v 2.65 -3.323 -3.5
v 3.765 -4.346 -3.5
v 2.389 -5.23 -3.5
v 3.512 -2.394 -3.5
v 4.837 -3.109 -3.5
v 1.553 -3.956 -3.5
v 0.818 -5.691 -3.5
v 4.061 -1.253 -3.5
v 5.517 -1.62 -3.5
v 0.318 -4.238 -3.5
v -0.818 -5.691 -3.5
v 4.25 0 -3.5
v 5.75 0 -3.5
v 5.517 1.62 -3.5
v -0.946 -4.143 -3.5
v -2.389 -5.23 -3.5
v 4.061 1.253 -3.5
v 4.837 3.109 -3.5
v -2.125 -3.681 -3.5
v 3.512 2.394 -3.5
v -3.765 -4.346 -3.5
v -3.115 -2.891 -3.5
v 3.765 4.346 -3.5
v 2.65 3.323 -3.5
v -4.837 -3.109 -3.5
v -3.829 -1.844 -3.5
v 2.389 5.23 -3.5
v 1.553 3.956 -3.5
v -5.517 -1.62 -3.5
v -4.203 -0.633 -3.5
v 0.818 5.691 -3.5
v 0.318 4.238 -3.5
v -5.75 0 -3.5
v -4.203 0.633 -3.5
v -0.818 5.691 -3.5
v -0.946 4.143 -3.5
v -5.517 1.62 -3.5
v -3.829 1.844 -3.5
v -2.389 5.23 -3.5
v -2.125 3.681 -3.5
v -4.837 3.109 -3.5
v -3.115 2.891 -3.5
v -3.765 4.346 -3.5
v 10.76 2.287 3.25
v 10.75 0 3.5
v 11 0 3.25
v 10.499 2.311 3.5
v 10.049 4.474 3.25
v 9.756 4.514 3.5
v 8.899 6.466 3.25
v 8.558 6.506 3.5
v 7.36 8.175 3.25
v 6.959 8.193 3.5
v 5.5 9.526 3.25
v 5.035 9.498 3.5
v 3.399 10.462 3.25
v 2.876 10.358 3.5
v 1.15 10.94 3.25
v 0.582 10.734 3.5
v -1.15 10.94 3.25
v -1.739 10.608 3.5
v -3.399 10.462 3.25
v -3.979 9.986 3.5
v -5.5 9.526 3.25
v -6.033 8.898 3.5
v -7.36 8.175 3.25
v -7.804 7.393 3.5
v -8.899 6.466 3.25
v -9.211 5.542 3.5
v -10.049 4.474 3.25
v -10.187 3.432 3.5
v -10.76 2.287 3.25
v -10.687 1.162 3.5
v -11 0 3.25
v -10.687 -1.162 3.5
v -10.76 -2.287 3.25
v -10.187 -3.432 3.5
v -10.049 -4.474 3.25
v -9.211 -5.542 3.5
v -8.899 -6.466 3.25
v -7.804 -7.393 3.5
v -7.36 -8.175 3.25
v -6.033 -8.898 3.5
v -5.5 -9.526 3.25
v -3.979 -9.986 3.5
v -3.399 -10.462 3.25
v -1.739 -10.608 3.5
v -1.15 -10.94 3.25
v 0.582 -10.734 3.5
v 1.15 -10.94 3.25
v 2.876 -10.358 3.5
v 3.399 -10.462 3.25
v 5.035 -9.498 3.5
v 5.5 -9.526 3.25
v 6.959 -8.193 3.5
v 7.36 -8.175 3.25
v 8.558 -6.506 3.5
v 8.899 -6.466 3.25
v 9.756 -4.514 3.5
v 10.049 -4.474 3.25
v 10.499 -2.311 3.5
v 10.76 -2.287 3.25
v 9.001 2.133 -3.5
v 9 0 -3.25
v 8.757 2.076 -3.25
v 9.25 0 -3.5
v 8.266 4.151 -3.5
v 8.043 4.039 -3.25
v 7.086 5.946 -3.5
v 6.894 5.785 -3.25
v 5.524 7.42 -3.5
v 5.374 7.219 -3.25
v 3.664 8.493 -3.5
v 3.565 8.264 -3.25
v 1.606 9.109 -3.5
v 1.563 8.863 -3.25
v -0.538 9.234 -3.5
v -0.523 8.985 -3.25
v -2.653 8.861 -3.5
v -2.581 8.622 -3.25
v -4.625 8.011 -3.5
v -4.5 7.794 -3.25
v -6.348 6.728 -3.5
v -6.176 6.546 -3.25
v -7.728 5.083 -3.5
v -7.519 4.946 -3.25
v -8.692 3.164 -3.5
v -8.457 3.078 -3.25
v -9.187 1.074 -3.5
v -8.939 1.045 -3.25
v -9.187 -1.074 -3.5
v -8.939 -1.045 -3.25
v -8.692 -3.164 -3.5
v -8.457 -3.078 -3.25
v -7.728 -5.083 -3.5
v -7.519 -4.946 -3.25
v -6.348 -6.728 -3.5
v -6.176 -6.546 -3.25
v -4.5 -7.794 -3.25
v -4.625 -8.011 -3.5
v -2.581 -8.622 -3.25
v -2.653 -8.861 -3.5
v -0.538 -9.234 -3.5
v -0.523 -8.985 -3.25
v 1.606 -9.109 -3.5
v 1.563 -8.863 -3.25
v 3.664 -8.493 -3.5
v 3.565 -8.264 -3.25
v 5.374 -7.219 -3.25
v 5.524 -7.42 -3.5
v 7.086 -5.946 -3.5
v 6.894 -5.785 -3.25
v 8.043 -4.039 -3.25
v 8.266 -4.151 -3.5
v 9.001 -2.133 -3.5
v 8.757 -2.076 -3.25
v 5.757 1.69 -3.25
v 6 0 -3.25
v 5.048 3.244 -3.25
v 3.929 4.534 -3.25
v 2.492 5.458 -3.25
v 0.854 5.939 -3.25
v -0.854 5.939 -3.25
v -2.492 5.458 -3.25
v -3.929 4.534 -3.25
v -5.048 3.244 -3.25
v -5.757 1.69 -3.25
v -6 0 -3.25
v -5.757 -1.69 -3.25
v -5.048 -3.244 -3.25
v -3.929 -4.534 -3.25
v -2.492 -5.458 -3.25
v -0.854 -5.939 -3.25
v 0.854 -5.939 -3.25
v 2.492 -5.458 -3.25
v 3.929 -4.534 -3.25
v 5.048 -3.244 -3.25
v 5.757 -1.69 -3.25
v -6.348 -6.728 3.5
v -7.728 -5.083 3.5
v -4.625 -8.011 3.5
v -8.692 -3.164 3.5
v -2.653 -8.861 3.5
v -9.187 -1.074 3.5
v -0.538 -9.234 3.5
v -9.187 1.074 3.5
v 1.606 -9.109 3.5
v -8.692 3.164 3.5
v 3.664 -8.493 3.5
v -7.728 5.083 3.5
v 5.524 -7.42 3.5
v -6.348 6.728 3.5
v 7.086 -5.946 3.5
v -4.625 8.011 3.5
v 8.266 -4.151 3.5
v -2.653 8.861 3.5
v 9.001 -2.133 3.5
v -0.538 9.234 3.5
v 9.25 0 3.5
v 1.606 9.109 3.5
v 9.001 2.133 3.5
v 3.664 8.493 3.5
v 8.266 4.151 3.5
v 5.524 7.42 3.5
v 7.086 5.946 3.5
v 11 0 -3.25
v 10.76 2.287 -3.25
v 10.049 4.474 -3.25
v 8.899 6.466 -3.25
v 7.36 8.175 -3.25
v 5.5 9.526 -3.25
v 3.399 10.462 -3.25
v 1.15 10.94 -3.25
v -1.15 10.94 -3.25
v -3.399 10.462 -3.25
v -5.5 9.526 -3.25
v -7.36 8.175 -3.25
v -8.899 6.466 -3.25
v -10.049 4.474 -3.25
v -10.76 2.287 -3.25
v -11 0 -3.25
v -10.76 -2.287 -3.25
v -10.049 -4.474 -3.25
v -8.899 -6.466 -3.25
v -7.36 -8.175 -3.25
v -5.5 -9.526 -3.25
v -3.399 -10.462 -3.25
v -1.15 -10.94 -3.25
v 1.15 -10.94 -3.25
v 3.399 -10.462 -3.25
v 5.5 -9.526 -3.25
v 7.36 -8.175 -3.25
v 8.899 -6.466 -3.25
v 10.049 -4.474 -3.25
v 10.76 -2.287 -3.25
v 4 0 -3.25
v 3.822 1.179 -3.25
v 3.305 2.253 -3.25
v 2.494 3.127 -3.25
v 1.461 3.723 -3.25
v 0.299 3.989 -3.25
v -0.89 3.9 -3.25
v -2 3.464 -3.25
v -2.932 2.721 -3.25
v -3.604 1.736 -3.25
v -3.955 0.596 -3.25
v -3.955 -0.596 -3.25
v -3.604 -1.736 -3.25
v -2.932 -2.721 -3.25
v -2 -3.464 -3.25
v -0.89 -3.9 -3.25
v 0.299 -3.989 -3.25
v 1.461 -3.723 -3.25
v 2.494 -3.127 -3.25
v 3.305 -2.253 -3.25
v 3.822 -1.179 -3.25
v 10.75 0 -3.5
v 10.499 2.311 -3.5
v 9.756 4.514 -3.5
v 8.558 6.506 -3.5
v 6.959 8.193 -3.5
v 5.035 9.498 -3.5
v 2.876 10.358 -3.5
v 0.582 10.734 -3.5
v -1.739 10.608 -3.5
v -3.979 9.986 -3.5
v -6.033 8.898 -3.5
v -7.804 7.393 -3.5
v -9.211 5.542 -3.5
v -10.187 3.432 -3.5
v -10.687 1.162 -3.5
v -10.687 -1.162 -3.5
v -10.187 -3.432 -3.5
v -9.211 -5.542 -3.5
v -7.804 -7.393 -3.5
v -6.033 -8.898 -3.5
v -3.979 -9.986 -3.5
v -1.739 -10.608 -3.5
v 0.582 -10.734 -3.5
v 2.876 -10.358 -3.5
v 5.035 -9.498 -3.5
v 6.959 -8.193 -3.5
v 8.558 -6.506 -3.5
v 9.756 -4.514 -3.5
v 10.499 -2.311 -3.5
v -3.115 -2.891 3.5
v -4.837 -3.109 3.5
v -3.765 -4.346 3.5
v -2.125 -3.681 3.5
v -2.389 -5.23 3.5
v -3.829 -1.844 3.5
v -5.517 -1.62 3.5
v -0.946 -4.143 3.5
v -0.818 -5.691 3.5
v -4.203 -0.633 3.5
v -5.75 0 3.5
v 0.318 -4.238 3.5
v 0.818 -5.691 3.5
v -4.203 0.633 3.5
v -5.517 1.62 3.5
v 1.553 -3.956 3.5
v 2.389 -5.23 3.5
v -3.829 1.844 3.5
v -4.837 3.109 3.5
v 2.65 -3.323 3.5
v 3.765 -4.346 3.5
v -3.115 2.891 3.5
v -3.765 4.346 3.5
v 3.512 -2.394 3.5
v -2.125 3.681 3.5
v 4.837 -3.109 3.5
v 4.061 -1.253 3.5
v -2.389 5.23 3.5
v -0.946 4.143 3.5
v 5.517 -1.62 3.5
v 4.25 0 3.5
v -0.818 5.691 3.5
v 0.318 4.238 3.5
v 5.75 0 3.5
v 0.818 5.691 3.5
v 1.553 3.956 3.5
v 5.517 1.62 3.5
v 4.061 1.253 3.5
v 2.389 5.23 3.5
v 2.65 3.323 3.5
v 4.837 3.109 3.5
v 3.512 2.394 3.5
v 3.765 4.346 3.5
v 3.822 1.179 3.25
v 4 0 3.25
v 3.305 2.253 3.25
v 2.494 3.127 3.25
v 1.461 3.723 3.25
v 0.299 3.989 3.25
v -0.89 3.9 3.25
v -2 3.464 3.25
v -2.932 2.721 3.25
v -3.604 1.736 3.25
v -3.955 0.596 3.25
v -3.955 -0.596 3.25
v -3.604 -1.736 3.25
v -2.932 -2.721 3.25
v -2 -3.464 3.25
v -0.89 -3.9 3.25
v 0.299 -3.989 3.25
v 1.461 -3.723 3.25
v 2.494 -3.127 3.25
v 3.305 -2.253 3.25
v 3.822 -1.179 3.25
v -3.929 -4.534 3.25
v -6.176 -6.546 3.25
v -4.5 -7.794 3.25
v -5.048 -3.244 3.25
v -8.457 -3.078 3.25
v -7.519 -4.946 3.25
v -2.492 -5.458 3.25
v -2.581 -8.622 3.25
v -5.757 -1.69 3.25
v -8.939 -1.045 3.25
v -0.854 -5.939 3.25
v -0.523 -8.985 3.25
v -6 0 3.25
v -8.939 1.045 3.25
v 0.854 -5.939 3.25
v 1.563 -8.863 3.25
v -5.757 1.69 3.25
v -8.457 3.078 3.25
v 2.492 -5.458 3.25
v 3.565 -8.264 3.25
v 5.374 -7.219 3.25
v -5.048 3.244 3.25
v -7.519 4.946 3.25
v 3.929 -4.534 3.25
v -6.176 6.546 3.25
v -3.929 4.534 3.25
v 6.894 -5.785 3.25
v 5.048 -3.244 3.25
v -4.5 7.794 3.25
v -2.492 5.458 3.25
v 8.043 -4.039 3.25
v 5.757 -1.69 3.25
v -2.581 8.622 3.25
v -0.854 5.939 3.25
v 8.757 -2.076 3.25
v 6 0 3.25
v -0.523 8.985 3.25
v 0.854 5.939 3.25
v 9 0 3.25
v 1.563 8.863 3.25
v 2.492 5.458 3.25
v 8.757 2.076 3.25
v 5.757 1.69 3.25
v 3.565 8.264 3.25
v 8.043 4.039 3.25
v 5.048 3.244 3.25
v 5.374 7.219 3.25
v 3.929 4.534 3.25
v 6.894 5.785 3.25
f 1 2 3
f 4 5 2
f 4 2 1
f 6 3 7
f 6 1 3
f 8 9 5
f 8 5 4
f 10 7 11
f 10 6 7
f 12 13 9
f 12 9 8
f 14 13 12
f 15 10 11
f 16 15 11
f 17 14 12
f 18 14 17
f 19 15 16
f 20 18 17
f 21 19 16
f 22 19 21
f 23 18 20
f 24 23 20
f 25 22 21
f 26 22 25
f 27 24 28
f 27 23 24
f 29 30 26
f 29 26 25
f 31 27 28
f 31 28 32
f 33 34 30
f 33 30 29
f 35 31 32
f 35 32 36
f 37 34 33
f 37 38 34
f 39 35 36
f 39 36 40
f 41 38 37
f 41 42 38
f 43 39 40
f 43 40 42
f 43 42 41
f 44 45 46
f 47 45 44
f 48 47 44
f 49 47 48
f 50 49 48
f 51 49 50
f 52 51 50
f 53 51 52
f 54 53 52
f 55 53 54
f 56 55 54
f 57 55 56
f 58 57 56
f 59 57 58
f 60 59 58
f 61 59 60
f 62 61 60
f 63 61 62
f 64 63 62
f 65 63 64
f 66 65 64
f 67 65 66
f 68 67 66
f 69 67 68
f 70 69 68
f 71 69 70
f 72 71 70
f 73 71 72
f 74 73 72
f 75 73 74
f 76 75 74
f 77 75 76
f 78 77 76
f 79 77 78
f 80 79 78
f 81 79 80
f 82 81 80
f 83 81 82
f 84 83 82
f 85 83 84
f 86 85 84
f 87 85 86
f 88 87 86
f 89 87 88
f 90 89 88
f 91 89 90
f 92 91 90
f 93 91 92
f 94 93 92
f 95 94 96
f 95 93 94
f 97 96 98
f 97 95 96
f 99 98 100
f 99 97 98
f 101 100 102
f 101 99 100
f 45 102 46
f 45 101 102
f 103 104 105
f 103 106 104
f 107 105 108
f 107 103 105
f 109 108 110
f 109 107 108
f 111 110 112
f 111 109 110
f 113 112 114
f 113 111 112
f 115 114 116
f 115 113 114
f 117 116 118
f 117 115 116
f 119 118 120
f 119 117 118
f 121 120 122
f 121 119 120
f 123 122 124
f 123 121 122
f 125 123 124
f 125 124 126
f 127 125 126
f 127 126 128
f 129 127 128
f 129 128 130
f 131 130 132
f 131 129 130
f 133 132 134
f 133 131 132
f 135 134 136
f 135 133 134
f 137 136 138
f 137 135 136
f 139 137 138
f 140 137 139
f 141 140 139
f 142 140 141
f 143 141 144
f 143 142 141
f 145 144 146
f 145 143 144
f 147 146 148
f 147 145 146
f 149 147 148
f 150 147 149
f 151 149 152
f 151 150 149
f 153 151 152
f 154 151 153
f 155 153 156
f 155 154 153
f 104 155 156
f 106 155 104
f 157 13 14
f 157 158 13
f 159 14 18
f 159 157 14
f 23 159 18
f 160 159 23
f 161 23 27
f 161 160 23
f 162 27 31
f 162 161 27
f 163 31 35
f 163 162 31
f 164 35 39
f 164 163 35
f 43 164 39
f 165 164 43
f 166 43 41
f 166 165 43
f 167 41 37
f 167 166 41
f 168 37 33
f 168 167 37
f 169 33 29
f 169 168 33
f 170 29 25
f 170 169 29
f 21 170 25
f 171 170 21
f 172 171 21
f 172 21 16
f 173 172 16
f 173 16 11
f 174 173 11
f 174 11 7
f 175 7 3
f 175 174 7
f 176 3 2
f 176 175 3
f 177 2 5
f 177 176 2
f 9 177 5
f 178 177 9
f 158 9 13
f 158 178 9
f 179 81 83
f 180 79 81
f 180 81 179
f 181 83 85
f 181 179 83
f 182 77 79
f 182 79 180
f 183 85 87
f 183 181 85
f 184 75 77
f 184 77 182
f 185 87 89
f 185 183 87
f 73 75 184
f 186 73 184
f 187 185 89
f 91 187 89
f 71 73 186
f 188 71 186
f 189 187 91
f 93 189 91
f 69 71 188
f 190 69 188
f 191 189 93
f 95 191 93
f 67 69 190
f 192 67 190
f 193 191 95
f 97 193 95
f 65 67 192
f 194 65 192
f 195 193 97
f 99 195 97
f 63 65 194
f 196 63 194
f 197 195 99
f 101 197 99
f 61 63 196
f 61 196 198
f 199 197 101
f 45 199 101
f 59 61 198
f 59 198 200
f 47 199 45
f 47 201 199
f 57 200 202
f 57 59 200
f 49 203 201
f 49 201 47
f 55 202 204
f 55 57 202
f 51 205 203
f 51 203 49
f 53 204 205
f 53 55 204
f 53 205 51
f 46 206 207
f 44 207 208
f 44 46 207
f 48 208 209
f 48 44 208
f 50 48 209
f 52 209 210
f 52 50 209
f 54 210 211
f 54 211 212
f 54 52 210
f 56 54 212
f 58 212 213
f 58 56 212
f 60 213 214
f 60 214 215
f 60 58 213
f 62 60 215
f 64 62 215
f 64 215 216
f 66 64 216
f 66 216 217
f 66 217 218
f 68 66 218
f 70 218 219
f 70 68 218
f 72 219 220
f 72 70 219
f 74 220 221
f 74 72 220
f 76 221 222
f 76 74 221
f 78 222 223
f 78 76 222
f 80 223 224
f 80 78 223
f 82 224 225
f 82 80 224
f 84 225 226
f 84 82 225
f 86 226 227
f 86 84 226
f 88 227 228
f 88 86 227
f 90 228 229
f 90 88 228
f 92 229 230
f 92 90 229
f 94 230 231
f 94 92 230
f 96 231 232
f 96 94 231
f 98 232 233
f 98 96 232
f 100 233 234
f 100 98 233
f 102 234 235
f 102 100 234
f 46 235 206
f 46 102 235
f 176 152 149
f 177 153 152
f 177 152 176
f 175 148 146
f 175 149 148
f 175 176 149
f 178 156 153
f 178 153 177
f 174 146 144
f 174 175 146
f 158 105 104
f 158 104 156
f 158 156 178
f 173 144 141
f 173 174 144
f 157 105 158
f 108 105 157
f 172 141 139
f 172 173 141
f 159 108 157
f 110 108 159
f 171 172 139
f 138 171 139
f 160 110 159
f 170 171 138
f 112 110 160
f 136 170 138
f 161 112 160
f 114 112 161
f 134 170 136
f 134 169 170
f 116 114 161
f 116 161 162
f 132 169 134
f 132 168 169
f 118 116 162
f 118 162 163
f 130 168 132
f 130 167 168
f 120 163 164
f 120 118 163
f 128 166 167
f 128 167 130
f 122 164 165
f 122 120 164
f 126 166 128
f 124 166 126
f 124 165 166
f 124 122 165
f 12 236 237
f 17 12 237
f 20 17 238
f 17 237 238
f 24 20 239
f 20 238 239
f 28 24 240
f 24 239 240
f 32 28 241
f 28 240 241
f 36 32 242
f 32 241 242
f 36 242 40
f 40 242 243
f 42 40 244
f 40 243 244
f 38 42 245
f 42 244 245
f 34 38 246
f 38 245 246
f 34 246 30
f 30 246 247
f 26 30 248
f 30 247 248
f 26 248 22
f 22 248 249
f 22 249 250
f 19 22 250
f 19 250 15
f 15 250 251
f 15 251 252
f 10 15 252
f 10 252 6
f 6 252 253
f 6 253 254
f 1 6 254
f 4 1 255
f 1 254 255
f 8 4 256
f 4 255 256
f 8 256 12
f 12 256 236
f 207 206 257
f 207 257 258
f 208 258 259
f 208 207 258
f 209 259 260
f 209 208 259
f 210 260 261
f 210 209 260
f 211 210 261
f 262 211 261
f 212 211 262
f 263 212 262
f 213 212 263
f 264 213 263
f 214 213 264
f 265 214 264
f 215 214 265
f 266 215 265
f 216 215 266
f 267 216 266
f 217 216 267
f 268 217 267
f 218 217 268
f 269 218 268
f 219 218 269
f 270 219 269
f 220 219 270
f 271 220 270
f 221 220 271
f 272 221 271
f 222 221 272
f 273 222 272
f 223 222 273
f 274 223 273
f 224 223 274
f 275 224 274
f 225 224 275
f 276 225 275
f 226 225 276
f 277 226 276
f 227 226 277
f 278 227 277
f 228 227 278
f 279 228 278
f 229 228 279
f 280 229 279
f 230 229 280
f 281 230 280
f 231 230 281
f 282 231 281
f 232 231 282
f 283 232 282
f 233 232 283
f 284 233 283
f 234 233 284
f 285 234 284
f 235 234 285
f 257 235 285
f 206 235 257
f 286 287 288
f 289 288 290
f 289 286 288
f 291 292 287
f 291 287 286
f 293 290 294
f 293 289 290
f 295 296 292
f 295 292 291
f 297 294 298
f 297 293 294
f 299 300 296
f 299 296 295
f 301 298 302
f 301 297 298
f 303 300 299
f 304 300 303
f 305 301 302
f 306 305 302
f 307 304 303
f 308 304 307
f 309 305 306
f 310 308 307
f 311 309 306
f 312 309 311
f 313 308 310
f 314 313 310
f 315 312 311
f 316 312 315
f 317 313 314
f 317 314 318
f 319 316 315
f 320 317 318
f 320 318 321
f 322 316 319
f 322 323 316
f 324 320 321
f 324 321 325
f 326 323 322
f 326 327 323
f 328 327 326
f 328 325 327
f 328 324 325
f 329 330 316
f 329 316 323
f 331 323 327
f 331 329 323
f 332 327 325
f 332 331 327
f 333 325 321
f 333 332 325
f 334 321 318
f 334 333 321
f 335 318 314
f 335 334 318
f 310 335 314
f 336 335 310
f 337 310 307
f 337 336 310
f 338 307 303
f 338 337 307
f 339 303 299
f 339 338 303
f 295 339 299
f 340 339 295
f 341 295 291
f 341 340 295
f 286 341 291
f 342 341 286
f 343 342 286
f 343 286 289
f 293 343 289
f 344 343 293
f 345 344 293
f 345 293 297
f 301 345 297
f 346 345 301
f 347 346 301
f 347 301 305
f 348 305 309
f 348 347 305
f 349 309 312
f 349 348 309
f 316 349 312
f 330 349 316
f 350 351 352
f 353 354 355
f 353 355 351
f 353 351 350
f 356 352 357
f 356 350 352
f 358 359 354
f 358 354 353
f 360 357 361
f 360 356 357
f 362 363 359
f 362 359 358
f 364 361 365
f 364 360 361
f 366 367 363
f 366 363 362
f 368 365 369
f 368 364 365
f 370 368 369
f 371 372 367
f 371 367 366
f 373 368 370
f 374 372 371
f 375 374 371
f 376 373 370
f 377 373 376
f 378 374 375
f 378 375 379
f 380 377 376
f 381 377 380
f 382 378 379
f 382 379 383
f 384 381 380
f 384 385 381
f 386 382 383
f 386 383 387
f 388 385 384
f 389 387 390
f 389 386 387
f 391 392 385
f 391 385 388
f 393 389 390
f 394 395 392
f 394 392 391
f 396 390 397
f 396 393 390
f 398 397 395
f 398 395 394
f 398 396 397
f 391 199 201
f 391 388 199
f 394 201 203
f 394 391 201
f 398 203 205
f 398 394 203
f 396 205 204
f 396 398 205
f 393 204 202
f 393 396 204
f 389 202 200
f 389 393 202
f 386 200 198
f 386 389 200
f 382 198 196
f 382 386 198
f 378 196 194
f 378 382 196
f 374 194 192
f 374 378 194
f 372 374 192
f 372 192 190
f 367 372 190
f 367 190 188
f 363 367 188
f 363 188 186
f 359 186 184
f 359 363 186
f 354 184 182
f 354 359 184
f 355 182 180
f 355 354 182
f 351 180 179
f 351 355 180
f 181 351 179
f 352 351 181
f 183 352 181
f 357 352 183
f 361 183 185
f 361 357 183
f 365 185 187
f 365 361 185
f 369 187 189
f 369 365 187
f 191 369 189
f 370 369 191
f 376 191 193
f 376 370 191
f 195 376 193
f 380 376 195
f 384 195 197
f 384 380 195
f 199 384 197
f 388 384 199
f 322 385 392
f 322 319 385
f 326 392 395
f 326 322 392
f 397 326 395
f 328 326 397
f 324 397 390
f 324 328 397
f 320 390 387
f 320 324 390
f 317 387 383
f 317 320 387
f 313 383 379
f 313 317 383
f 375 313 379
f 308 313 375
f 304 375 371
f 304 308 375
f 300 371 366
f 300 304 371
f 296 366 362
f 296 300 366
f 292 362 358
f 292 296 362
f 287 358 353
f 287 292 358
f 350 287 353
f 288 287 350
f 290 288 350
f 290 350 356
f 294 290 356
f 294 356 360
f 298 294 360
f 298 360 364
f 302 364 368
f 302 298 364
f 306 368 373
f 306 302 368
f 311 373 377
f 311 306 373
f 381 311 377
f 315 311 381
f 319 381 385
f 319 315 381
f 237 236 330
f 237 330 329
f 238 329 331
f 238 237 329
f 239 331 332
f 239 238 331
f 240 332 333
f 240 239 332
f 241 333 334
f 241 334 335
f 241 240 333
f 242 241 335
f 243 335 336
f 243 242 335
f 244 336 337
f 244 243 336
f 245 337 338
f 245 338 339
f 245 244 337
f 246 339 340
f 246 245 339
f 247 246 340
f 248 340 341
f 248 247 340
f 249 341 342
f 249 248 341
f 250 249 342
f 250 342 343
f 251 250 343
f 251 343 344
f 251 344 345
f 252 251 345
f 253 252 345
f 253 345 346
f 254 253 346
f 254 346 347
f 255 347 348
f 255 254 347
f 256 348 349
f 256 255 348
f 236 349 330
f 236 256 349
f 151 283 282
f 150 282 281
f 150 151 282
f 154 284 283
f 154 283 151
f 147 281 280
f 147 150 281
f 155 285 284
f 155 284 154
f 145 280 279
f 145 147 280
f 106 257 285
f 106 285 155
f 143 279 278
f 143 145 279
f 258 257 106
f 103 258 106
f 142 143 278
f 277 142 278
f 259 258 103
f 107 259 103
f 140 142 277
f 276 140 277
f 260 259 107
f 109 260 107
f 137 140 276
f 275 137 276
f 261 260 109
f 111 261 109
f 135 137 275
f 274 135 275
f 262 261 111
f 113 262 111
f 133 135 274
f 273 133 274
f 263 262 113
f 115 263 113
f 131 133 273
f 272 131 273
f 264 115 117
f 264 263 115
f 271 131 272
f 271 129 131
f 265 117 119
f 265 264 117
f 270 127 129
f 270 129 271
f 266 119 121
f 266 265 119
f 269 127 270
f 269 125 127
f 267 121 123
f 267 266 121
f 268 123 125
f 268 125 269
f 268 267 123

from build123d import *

# Parameters (mm, degrees)
CHAMFER_SIZE = 0.25


with BuildPart() as part:
    # Sketch → Revolution (revolve)
    with BuildSketch(Plane.XZ):
        Polygon((4, -3.5), (5.75, -3.5), (6, -3.25), (9, -3.25), (9.25, -3.5), (11, -3.5), (11, 3.5), (9.25, 3.5), (9, 3.25), (6, 3.25), (5.75, 3.5), (4, 3.5), align=None)
    revolve(axis=Axis((0, 0, 0), (0, 0, 1)))

    # Chamfer
    chamfer_edges = [part.edges().sort_by_distance(p)[0] for p in [
        (-4, 0, -3.5),
        (-4, 0, 3.5),
        (-11, 0, -3.5),
        (-11, 0, 3.5),
    ]]
    chamfer(chamfer_edges, length=CHAMFER_SIZE)


solid = part.part
